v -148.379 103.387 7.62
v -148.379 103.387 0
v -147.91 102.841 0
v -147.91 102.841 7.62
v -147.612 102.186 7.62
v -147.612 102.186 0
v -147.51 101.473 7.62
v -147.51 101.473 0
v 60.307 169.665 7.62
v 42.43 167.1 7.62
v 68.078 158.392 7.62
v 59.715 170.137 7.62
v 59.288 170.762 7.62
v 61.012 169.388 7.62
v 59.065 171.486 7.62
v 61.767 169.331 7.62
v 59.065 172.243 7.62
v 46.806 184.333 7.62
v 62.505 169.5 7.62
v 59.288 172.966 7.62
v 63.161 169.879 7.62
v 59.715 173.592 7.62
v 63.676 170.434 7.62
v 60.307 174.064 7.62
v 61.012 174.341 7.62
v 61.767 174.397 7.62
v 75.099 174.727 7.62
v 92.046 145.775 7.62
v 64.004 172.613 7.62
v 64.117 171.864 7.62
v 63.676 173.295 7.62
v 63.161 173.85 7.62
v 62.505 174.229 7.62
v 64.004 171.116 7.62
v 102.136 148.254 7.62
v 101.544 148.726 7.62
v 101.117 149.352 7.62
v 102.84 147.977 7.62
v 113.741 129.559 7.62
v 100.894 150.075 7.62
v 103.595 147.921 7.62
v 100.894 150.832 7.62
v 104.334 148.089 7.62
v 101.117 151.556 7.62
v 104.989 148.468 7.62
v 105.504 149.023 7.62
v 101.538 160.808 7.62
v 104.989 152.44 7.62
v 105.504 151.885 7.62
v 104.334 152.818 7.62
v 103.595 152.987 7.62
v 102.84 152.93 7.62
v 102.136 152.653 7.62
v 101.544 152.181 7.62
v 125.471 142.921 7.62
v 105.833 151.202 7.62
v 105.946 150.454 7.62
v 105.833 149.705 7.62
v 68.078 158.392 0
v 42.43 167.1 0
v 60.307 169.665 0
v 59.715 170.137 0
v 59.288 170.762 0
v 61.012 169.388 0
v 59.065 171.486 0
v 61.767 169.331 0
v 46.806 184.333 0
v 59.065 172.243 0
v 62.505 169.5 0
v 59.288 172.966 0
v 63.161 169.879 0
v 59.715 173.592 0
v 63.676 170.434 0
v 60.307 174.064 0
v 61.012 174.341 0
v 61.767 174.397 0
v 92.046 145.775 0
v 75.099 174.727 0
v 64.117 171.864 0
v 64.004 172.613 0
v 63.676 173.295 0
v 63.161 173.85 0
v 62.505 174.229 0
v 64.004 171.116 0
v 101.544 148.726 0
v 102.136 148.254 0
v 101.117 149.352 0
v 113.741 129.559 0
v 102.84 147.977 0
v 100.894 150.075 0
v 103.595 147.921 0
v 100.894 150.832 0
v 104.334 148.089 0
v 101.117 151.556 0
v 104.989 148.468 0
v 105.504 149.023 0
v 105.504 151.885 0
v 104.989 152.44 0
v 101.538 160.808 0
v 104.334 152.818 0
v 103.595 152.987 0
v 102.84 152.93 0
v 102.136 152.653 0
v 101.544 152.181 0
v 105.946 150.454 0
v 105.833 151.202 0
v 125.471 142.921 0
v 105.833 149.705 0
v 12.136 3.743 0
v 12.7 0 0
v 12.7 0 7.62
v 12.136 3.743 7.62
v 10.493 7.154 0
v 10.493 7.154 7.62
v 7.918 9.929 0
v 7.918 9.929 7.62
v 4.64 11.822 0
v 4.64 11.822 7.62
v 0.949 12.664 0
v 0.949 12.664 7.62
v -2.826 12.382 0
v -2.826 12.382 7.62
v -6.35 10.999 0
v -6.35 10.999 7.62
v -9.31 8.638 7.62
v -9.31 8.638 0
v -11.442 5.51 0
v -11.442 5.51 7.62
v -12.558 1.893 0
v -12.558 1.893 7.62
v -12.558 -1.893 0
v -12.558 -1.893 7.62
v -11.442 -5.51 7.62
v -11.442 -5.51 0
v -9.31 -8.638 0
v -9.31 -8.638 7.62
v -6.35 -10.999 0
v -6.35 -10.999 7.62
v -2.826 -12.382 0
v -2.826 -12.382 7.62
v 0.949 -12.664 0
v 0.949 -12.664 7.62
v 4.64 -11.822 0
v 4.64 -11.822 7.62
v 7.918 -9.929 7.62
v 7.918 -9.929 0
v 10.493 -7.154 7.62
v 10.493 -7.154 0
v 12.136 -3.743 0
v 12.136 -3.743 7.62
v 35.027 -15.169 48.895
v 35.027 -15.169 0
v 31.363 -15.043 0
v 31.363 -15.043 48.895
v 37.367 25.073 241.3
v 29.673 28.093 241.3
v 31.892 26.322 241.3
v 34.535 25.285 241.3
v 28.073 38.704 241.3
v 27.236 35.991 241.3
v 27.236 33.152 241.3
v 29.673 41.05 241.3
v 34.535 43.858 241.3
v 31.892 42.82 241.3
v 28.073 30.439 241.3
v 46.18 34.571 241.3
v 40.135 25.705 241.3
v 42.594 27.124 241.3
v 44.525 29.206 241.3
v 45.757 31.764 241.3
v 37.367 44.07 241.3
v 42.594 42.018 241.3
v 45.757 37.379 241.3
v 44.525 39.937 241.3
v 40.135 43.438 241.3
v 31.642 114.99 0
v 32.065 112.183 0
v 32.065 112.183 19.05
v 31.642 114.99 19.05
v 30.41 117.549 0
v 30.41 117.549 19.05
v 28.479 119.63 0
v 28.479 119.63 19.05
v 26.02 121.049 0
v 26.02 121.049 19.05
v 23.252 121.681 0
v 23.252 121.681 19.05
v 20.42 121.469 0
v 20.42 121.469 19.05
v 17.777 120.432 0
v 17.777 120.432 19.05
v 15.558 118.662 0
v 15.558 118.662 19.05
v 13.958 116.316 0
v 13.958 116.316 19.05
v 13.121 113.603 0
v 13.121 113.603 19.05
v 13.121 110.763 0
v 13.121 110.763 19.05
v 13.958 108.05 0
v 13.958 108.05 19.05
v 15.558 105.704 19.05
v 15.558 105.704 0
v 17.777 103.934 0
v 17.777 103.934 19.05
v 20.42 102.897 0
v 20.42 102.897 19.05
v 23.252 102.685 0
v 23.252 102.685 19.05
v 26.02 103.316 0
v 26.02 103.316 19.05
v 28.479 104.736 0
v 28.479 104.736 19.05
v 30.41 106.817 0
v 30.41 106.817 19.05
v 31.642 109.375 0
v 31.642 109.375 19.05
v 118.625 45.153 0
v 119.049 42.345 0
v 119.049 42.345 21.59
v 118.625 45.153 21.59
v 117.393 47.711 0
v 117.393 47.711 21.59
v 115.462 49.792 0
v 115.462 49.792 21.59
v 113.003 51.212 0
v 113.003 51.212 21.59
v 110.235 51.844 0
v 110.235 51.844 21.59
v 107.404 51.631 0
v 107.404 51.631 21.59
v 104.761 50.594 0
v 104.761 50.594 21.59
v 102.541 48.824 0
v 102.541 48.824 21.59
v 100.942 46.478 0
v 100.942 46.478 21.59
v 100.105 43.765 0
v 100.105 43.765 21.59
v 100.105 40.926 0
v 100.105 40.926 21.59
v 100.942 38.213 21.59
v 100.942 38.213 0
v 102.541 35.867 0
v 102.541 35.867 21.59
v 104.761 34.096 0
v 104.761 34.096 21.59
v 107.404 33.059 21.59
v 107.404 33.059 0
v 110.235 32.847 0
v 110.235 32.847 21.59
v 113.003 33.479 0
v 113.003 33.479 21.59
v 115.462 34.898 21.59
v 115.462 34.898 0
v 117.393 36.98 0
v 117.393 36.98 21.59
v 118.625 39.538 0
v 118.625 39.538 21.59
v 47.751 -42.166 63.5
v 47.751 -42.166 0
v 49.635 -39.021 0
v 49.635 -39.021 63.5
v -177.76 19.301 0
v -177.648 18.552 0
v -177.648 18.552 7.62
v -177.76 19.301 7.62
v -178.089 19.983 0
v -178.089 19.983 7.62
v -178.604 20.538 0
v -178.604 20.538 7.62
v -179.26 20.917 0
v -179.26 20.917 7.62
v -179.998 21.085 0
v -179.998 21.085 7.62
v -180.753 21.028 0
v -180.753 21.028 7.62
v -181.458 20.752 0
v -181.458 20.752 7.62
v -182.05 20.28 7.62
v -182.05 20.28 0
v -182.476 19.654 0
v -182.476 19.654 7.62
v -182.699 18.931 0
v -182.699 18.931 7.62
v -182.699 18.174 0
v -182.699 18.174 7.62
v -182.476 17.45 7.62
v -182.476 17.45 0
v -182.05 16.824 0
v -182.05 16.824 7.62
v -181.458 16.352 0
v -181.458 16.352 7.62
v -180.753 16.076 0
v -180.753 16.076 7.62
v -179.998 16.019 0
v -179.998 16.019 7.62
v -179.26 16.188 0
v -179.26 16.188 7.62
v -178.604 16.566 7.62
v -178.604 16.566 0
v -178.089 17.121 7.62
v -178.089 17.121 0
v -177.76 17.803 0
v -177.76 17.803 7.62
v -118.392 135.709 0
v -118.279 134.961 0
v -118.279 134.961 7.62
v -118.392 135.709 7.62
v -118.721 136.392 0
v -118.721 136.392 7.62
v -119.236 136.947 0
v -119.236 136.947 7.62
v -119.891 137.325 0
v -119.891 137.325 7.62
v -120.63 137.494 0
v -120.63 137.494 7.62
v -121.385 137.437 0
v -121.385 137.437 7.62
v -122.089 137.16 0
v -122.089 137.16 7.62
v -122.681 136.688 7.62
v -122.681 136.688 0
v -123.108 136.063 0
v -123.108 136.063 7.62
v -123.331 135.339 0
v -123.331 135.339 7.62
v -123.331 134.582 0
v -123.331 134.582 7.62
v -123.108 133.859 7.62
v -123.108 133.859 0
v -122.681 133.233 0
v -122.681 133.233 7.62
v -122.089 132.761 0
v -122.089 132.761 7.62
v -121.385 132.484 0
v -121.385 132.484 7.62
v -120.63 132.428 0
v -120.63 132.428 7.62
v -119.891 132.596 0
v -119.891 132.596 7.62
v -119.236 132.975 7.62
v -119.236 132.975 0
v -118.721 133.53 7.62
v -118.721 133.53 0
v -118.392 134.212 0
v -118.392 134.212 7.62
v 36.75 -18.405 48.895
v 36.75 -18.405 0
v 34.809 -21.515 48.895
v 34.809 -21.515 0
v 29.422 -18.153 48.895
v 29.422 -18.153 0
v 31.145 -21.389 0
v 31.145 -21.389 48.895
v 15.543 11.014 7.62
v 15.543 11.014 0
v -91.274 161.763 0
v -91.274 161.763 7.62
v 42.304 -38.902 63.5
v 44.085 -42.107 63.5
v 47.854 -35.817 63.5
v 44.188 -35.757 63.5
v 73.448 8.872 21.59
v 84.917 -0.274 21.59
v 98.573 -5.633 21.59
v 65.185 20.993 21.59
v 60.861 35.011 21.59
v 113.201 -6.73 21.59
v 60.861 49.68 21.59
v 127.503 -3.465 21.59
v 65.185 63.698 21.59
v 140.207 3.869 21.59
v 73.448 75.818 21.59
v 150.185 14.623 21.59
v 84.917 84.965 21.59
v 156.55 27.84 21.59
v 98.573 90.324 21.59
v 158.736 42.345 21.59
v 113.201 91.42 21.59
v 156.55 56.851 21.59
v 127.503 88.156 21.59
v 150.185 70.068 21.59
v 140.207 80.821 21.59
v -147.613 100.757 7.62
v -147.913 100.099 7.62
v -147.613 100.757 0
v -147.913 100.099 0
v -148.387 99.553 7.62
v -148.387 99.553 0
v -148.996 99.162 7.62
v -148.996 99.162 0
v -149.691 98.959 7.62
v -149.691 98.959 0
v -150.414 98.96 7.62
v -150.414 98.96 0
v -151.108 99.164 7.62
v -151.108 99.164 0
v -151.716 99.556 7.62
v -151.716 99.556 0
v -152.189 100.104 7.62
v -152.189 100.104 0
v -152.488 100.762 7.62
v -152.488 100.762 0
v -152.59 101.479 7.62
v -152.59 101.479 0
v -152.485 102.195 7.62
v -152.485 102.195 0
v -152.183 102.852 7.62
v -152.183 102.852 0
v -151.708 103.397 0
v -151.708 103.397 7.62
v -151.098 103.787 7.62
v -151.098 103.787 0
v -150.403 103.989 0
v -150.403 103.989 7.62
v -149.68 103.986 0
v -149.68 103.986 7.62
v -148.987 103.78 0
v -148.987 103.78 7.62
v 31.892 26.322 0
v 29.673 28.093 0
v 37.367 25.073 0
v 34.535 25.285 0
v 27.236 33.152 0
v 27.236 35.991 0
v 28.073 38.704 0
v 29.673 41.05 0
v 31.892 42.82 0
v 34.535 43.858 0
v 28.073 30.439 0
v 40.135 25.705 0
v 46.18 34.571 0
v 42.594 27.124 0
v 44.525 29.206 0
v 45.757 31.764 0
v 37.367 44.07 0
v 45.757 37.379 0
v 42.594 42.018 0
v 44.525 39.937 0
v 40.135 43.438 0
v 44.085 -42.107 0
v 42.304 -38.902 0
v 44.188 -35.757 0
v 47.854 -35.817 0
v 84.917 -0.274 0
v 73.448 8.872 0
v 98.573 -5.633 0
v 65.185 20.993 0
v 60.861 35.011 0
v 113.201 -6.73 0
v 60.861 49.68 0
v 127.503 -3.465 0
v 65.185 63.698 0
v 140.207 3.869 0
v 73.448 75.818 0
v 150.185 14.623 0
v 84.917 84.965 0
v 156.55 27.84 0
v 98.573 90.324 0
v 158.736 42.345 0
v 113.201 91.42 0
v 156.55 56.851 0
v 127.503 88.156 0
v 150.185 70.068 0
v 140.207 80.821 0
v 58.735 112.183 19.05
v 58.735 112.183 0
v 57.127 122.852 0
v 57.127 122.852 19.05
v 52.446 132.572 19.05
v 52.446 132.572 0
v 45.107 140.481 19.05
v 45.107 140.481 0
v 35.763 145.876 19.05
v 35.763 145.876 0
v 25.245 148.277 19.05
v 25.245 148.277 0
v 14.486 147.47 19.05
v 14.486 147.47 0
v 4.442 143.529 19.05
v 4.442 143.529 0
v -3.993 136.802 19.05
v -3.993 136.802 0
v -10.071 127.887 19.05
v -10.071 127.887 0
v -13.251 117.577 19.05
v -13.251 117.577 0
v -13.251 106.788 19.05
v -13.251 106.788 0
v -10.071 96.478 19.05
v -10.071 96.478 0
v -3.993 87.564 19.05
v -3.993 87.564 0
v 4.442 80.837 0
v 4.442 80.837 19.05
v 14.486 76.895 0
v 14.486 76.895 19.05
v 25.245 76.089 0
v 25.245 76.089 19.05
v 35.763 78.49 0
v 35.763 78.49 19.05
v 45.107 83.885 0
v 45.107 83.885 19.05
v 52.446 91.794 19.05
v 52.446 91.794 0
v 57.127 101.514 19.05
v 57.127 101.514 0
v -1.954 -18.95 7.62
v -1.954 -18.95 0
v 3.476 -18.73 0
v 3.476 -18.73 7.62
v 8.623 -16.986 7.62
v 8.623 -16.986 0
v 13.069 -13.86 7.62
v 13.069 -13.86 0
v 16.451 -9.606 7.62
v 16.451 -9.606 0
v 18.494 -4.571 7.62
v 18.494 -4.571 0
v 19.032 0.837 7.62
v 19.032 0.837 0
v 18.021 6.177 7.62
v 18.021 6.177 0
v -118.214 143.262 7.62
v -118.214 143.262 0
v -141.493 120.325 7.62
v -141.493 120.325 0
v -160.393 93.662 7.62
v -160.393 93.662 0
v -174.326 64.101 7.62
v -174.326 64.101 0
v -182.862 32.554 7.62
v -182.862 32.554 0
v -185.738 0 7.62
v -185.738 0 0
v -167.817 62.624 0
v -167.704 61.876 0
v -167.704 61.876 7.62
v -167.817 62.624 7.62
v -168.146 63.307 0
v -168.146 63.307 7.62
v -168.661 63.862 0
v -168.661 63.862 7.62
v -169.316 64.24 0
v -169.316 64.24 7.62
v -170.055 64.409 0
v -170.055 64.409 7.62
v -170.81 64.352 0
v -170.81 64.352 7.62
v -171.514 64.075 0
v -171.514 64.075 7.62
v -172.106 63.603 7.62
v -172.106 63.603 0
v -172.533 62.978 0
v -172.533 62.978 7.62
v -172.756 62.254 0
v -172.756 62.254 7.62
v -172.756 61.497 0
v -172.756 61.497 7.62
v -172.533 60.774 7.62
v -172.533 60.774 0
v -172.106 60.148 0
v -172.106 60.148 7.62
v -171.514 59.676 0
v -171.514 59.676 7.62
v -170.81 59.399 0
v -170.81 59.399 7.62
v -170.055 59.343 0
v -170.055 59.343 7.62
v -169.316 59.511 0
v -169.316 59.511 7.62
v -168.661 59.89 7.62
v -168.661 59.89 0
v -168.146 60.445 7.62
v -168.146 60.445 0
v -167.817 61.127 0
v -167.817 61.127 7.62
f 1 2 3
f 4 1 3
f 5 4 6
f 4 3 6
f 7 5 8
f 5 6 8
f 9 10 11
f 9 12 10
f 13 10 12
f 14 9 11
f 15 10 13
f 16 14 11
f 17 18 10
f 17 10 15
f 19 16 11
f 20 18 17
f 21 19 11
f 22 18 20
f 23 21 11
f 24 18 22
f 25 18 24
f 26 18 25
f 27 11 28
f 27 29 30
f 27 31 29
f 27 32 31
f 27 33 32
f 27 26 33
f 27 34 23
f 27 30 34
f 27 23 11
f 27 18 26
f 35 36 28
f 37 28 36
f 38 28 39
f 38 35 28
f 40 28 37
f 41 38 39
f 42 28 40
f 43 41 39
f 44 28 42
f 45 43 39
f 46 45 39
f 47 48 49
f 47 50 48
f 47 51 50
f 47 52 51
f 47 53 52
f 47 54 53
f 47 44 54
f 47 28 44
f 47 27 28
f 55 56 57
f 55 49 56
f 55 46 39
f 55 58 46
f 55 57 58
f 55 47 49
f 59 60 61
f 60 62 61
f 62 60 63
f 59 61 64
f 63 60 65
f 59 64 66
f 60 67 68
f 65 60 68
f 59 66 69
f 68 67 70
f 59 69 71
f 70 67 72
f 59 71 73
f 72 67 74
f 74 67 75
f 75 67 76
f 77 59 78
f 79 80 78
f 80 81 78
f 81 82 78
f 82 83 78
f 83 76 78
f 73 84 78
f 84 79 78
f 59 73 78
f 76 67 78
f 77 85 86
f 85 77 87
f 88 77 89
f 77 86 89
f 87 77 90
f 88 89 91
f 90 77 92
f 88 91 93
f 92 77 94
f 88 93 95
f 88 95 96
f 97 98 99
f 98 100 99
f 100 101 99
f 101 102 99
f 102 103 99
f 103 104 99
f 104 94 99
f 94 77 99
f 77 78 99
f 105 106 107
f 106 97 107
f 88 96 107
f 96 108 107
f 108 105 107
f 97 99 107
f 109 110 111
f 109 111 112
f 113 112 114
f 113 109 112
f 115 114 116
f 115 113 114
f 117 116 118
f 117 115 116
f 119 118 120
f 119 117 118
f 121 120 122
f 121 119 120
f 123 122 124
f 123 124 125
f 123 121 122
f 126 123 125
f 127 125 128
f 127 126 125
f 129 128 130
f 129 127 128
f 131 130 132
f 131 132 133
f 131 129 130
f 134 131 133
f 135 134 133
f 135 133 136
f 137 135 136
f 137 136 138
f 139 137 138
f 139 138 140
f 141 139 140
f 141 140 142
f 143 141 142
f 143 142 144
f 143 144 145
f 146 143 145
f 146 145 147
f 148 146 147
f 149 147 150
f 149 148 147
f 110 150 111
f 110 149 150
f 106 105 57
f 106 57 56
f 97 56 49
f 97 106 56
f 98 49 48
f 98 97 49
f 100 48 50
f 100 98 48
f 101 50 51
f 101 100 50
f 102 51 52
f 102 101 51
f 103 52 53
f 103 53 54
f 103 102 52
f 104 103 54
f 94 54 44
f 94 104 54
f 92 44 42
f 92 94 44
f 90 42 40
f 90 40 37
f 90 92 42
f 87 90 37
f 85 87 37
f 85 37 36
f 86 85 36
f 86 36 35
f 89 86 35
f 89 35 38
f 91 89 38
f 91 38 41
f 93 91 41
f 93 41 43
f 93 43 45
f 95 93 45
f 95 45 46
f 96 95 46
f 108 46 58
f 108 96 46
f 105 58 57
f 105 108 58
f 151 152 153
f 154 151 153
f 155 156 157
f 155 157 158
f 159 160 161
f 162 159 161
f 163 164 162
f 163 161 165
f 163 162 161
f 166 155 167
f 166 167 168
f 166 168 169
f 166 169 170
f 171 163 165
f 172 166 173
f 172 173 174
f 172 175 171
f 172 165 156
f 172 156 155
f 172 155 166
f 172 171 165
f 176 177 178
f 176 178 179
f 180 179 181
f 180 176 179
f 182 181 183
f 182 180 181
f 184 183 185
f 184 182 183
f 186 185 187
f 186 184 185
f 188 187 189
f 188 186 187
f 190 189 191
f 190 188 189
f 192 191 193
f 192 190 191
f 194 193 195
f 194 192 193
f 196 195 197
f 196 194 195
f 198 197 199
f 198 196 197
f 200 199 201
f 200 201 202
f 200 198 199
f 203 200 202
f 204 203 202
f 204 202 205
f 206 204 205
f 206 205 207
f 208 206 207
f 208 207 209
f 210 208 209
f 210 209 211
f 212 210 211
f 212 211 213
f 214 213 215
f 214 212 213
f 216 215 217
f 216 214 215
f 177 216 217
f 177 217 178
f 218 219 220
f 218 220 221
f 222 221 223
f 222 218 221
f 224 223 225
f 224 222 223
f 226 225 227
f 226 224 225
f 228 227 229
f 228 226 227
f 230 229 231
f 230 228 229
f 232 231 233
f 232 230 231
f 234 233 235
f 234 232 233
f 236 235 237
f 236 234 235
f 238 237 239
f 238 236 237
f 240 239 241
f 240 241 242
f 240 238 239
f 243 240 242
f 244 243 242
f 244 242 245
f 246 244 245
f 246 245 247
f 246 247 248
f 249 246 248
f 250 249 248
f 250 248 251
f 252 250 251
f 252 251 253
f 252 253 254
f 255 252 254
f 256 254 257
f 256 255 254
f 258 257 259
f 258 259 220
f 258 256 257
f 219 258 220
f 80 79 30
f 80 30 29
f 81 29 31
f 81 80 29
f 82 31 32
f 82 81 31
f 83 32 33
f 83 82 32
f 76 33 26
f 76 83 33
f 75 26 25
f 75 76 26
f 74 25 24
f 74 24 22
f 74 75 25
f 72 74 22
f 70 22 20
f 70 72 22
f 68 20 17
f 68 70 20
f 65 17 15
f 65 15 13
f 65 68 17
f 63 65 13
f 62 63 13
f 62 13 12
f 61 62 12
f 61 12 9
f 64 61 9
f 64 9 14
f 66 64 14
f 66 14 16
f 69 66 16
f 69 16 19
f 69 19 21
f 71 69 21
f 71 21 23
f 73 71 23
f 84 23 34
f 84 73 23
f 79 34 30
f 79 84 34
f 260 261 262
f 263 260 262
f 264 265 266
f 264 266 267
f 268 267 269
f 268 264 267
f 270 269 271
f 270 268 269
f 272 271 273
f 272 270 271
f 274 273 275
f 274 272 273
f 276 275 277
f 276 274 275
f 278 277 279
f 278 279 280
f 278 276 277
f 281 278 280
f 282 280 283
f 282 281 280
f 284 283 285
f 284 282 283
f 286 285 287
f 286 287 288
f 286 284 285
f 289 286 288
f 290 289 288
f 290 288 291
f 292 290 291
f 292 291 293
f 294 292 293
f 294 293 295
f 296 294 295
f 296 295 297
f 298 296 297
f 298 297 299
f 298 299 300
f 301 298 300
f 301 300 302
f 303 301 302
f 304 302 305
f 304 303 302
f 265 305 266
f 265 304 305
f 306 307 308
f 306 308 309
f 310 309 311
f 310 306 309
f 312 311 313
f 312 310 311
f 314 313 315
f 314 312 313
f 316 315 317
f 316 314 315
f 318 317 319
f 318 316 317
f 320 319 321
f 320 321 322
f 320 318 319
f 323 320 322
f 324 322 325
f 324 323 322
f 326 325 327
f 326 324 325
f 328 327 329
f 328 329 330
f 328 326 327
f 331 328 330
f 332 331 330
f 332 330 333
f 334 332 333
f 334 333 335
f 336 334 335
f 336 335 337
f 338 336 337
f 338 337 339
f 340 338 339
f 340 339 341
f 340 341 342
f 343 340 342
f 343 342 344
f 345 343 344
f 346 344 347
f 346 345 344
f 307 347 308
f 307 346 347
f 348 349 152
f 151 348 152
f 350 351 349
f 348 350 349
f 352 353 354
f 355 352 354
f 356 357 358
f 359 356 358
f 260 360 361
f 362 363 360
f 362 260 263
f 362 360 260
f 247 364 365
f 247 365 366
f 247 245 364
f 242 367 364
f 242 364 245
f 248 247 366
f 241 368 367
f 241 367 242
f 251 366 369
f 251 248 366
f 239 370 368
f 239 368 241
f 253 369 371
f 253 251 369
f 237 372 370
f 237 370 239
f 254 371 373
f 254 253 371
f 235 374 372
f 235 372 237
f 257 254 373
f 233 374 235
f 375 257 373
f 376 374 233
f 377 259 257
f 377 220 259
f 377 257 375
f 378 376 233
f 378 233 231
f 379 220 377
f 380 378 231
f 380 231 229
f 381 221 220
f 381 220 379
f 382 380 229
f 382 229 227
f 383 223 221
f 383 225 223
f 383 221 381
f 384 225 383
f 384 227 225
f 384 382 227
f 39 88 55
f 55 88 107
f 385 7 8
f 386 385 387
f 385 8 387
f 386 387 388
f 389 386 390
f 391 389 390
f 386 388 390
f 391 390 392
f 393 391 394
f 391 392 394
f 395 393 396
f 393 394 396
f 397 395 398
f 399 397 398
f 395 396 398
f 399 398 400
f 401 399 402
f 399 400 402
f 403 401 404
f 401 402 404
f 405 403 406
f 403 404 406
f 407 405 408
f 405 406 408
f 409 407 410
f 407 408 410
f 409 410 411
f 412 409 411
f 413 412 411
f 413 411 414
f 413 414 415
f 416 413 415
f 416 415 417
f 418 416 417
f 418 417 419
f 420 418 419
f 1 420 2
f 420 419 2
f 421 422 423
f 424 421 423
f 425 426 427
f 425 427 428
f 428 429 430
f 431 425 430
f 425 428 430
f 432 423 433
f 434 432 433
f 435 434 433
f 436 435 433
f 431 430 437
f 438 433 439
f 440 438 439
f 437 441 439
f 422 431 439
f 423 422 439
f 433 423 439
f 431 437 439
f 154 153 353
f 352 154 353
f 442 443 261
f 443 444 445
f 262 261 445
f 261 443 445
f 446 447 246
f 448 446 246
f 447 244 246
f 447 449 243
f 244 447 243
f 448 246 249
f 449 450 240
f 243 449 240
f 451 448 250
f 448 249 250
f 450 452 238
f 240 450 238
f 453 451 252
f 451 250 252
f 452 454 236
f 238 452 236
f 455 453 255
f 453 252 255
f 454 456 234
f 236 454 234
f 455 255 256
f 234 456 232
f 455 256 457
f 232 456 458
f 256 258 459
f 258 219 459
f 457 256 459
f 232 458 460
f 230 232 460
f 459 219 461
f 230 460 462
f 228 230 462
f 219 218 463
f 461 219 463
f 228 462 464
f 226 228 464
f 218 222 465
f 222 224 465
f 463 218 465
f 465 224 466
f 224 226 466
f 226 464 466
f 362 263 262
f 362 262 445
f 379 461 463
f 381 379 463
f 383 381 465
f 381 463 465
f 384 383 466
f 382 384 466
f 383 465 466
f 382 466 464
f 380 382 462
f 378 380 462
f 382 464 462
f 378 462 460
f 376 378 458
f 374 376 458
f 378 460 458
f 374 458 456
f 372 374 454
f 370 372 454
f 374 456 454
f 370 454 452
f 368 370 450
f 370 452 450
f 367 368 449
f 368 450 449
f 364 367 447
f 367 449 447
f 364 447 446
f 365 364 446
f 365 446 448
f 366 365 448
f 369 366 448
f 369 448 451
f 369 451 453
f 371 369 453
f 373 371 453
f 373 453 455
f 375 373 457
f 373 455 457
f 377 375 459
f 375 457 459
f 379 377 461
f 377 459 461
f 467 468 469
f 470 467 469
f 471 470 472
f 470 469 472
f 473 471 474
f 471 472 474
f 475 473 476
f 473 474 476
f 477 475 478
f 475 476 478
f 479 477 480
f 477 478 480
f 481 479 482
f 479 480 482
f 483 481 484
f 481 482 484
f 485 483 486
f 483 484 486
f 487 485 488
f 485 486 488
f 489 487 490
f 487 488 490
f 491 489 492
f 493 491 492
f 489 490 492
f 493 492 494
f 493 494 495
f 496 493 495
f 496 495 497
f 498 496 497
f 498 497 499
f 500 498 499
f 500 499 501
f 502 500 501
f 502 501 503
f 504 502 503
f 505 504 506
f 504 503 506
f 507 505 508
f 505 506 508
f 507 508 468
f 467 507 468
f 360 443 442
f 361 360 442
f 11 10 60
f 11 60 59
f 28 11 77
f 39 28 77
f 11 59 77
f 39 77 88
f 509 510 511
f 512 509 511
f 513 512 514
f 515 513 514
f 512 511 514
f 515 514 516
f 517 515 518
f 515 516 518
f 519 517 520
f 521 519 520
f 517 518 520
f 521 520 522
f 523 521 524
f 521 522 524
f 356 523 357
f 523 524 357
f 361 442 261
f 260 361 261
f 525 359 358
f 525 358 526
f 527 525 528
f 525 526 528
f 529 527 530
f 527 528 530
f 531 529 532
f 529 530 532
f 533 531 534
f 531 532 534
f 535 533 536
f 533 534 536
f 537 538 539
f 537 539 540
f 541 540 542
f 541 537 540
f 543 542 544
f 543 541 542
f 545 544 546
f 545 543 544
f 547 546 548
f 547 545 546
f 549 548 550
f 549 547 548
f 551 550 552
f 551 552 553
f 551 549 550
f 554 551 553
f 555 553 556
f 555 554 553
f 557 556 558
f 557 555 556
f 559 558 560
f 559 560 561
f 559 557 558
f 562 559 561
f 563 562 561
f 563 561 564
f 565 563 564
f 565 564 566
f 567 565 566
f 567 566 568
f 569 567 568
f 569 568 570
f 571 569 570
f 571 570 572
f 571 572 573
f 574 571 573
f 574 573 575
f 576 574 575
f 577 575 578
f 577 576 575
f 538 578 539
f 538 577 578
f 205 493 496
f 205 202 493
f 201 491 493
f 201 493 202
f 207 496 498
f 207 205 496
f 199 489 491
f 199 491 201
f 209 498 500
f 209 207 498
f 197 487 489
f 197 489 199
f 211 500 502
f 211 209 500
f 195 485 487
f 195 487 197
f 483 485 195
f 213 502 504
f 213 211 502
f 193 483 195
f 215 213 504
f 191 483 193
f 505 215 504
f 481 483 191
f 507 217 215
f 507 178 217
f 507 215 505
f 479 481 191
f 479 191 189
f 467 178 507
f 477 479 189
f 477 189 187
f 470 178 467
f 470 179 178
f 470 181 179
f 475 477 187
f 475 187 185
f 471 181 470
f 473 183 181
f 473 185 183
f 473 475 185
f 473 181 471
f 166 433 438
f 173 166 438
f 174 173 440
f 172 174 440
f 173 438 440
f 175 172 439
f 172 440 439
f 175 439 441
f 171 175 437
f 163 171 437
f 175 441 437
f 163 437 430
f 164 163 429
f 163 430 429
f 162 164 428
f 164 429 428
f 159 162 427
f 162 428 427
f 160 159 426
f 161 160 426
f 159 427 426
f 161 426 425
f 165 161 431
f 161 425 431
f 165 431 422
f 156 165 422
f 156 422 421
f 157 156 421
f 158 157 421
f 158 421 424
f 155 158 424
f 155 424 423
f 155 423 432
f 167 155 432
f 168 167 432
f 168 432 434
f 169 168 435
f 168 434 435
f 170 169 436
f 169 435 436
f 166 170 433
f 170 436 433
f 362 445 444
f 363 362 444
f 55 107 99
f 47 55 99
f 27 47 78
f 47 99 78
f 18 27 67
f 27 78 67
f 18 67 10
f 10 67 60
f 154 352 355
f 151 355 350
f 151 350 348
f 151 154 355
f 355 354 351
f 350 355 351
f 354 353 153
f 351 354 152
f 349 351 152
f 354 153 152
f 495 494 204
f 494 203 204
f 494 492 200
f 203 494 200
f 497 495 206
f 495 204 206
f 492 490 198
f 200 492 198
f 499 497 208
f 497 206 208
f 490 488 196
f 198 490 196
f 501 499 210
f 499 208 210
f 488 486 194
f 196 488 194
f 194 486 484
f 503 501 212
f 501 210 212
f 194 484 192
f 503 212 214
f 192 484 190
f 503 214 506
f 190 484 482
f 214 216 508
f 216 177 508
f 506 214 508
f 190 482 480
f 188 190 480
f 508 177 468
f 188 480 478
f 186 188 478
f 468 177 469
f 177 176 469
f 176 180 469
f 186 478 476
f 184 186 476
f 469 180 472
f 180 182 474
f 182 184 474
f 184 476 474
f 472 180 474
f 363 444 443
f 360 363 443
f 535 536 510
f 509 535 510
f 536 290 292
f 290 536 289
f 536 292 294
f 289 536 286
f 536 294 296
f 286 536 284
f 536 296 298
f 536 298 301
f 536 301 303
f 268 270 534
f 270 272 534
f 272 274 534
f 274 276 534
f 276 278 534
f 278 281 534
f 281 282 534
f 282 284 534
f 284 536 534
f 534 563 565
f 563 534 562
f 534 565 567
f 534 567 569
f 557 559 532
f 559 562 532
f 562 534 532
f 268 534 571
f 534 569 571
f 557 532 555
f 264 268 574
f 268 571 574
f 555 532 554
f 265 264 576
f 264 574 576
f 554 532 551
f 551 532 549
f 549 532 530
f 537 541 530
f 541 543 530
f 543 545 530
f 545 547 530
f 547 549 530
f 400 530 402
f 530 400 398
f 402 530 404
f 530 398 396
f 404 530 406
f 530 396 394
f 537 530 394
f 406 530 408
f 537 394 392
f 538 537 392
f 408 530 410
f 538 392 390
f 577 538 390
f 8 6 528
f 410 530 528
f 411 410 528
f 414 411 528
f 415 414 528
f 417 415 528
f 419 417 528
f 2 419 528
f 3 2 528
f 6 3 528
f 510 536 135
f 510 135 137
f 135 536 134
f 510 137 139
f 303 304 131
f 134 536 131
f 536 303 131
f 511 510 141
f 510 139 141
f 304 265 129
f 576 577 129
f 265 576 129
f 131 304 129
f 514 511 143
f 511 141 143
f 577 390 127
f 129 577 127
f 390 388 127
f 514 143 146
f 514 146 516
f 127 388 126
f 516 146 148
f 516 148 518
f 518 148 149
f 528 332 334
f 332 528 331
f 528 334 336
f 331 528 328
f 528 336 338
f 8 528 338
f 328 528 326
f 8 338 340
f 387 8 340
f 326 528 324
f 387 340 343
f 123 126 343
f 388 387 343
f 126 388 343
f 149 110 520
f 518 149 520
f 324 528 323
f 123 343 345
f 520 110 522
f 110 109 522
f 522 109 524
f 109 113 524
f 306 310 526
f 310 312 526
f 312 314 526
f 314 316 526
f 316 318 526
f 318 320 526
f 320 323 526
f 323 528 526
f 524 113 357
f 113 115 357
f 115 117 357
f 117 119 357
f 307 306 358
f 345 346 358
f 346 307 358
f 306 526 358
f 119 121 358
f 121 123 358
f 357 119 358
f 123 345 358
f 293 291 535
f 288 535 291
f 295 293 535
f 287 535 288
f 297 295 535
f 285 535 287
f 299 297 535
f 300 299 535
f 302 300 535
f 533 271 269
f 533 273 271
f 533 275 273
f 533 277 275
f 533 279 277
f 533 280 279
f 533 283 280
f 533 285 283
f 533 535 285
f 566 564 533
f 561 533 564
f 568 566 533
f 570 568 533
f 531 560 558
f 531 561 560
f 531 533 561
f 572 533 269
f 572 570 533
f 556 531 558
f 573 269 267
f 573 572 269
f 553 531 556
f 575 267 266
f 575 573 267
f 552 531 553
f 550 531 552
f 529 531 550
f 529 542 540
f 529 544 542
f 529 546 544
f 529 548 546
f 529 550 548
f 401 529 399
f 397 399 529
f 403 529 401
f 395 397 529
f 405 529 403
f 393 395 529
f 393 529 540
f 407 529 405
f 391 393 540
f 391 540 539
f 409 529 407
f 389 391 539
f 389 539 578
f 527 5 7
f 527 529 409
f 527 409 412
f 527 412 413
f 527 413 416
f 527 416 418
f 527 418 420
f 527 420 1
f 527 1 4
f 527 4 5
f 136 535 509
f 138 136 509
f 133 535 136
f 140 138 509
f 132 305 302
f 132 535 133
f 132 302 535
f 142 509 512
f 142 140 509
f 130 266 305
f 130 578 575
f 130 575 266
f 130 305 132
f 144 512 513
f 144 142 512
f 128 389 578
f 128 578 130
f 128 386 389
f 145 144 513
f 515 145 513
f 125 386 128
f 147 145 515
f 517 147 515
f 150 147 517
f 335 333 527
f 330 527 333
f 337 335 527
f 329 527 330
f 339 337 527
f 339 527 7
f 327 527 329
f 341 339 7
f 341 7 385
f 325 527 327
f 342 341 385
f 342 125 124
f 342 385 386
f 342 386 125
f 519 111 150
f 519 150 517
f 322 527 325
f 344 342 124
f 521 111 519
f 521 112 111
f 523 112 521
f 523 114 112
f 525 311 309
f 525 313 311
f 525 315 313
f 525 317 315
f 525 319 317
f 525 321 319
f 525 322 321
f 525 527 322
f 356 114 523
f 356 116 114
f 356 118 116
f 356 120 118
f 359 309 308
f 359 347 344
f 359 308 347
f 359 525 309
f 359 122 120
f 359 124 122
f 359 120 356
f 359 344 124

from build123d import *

# Parameters (mm, degrees)
F0_R      = 2.54
F0_R_2    = 12.7
F1_DEPTH  = 7.62
F2_R      = 9.525
F3_DEPTH  = 241.3
F4_R      = 49.2125
F4_R_2    = 9.525
F5_DEPTH  = 21.59
F7_DEPTH  = 48.895
F8_R      = 2.54
F9_DEPTH  = 7.62
F11_DEPTH = 63.5
F12_R     = 36.195
F12_R_2   = 9.525
F13_DEPTH = 19.05


with BuildPart() as f1:
    # F0 (on Top) → F1 (new body)
    with BuildSketch(Plane.XY):
        with BuildLine():
            Line((-185.7375, 0), (-1.953846, -18.949538))
            ThreePointArc((-1.953846, -18.949538), (16.450513, -9.60641), (15.543469, 11.013768))
            Line((15.543469, 11.013768), (-91.274466, 161.763379))
            ThreePointArc((-91.274466, 161.763379), (-160.392503, 93.6625), (-185.7375, 0))
        make_face()
        with Locations((-180.187555, 18.552109)):
            Circle(F0_R, mode=Mode.SUBTRACT)
        with Locations((-170.24433, 61.875715)):
            Circle(F0_R, mode=Mode.SUBTRACT)
        Circle(F0_R_2, mode=Mode.SUBTRACT)
        with BuildLine():
            ThreePointArc((-148.37932, 103.386952), (-147.73724, 102.524355), (-147.509614, 101.473391))
            ThreePointArc((-147.509614, 101.473391), (-152.361988, 100.422427), (-148.37932, 103.386952))
        make_face(mode=Mode.SUBTRACT)
        with Locations((-120.819461, 134.960712)):
            Circle(F0_R, mode=Mode.SUBTRACT)
    extrude(amount=F1_DEPTH)


with BuildPart() as f3:
    # F2 (on Top) → F3 (new body)
    with BuildSketch(Plane.XY):
        with Locations((36.65483, 34.57132)):
            Circle(F2_R)
    extrude(amount=F3_DEPTH)


with BuildPart() as f5:
    # F4 (on Top) → F5 (new body)
    with BuildSketch(Plane.XY):
        with Locations((109.523527, 42.345271)):
            Circle(F4_R)
        with Locations((109.523527, 42.345271)):
            Circle(F4_R_2, mode=Mode.SUBTRACT)
    extrude(amount=F5_DEPTH)


with BuildPart() as f7:
    # F6 (on Top) → F7 (new body)
    with BuildSketch(Plane.XY):
        Polygon((36.750368, -18.404827), (35.027291, -15.168805), (31.363275, -15.043022), (29.422336, -18.153261), (31.145413, -21.389283), (34.809429, -21.515066), align=None)
    extrude(amount=F7_DEPTH)


with BuildPart() as f9:
    # F8 (on Top) → F9 (new body)
    with BuildSketch(Plane.XY):
        with BuildLine():
            Line((113.741228, 129.55908), (125.471446, 142.920605))
            ThreePointArc((125.471446, 142.920605), (88.592481, 168.287717), (46.80607, 184.332784))
            Line((46.80607, 184.332784), (42.43021, 167.099669))
            ThreePointArc((42.43021, 167.099669), (80.310046, 152.554641), (113.741228, 129.55908))
        make_face()
        with Locations((103.405645, 150.453777)):
            Circle(F8_R, mode=Mode.SUBTRACT)
        with Locations((61.57686, 171.864356)):
            Circle(F8_R, mode=Mode.SUBTRACT)
    extrude(amount=F9_DEPTH)


with BuildPart() as f11:
    # F10 (on Top) → F11 (new body)
    with BuildSketch(Plane.XY):
        Polygon((49.635048, -39.020847), (47.853509, -35.816639), (44.187814, -35.757392), (42.303657, -38.902354), (44.085195, -42.106563), (47.750891, -42.165809), align=None)
    extrude(amount=F11_DEPTH)


with BuildPart() as f13:
    # F12 (on Top) → F13 (new body)
    with BuildSketch(Plane.XY):
        with Locations((22.539862, 112.182908)):
            Circle(F12_R)
        with Locations((22.539862, 112.182908)):
            Circle(F12_R_2, mode=Mode.SUBTRACT)
    extrude(amount=F13_DEPTH)


solid = Compound([f1.part, f3.part, f5.part, f7.part, f9.part, f11.part, f13.part])
